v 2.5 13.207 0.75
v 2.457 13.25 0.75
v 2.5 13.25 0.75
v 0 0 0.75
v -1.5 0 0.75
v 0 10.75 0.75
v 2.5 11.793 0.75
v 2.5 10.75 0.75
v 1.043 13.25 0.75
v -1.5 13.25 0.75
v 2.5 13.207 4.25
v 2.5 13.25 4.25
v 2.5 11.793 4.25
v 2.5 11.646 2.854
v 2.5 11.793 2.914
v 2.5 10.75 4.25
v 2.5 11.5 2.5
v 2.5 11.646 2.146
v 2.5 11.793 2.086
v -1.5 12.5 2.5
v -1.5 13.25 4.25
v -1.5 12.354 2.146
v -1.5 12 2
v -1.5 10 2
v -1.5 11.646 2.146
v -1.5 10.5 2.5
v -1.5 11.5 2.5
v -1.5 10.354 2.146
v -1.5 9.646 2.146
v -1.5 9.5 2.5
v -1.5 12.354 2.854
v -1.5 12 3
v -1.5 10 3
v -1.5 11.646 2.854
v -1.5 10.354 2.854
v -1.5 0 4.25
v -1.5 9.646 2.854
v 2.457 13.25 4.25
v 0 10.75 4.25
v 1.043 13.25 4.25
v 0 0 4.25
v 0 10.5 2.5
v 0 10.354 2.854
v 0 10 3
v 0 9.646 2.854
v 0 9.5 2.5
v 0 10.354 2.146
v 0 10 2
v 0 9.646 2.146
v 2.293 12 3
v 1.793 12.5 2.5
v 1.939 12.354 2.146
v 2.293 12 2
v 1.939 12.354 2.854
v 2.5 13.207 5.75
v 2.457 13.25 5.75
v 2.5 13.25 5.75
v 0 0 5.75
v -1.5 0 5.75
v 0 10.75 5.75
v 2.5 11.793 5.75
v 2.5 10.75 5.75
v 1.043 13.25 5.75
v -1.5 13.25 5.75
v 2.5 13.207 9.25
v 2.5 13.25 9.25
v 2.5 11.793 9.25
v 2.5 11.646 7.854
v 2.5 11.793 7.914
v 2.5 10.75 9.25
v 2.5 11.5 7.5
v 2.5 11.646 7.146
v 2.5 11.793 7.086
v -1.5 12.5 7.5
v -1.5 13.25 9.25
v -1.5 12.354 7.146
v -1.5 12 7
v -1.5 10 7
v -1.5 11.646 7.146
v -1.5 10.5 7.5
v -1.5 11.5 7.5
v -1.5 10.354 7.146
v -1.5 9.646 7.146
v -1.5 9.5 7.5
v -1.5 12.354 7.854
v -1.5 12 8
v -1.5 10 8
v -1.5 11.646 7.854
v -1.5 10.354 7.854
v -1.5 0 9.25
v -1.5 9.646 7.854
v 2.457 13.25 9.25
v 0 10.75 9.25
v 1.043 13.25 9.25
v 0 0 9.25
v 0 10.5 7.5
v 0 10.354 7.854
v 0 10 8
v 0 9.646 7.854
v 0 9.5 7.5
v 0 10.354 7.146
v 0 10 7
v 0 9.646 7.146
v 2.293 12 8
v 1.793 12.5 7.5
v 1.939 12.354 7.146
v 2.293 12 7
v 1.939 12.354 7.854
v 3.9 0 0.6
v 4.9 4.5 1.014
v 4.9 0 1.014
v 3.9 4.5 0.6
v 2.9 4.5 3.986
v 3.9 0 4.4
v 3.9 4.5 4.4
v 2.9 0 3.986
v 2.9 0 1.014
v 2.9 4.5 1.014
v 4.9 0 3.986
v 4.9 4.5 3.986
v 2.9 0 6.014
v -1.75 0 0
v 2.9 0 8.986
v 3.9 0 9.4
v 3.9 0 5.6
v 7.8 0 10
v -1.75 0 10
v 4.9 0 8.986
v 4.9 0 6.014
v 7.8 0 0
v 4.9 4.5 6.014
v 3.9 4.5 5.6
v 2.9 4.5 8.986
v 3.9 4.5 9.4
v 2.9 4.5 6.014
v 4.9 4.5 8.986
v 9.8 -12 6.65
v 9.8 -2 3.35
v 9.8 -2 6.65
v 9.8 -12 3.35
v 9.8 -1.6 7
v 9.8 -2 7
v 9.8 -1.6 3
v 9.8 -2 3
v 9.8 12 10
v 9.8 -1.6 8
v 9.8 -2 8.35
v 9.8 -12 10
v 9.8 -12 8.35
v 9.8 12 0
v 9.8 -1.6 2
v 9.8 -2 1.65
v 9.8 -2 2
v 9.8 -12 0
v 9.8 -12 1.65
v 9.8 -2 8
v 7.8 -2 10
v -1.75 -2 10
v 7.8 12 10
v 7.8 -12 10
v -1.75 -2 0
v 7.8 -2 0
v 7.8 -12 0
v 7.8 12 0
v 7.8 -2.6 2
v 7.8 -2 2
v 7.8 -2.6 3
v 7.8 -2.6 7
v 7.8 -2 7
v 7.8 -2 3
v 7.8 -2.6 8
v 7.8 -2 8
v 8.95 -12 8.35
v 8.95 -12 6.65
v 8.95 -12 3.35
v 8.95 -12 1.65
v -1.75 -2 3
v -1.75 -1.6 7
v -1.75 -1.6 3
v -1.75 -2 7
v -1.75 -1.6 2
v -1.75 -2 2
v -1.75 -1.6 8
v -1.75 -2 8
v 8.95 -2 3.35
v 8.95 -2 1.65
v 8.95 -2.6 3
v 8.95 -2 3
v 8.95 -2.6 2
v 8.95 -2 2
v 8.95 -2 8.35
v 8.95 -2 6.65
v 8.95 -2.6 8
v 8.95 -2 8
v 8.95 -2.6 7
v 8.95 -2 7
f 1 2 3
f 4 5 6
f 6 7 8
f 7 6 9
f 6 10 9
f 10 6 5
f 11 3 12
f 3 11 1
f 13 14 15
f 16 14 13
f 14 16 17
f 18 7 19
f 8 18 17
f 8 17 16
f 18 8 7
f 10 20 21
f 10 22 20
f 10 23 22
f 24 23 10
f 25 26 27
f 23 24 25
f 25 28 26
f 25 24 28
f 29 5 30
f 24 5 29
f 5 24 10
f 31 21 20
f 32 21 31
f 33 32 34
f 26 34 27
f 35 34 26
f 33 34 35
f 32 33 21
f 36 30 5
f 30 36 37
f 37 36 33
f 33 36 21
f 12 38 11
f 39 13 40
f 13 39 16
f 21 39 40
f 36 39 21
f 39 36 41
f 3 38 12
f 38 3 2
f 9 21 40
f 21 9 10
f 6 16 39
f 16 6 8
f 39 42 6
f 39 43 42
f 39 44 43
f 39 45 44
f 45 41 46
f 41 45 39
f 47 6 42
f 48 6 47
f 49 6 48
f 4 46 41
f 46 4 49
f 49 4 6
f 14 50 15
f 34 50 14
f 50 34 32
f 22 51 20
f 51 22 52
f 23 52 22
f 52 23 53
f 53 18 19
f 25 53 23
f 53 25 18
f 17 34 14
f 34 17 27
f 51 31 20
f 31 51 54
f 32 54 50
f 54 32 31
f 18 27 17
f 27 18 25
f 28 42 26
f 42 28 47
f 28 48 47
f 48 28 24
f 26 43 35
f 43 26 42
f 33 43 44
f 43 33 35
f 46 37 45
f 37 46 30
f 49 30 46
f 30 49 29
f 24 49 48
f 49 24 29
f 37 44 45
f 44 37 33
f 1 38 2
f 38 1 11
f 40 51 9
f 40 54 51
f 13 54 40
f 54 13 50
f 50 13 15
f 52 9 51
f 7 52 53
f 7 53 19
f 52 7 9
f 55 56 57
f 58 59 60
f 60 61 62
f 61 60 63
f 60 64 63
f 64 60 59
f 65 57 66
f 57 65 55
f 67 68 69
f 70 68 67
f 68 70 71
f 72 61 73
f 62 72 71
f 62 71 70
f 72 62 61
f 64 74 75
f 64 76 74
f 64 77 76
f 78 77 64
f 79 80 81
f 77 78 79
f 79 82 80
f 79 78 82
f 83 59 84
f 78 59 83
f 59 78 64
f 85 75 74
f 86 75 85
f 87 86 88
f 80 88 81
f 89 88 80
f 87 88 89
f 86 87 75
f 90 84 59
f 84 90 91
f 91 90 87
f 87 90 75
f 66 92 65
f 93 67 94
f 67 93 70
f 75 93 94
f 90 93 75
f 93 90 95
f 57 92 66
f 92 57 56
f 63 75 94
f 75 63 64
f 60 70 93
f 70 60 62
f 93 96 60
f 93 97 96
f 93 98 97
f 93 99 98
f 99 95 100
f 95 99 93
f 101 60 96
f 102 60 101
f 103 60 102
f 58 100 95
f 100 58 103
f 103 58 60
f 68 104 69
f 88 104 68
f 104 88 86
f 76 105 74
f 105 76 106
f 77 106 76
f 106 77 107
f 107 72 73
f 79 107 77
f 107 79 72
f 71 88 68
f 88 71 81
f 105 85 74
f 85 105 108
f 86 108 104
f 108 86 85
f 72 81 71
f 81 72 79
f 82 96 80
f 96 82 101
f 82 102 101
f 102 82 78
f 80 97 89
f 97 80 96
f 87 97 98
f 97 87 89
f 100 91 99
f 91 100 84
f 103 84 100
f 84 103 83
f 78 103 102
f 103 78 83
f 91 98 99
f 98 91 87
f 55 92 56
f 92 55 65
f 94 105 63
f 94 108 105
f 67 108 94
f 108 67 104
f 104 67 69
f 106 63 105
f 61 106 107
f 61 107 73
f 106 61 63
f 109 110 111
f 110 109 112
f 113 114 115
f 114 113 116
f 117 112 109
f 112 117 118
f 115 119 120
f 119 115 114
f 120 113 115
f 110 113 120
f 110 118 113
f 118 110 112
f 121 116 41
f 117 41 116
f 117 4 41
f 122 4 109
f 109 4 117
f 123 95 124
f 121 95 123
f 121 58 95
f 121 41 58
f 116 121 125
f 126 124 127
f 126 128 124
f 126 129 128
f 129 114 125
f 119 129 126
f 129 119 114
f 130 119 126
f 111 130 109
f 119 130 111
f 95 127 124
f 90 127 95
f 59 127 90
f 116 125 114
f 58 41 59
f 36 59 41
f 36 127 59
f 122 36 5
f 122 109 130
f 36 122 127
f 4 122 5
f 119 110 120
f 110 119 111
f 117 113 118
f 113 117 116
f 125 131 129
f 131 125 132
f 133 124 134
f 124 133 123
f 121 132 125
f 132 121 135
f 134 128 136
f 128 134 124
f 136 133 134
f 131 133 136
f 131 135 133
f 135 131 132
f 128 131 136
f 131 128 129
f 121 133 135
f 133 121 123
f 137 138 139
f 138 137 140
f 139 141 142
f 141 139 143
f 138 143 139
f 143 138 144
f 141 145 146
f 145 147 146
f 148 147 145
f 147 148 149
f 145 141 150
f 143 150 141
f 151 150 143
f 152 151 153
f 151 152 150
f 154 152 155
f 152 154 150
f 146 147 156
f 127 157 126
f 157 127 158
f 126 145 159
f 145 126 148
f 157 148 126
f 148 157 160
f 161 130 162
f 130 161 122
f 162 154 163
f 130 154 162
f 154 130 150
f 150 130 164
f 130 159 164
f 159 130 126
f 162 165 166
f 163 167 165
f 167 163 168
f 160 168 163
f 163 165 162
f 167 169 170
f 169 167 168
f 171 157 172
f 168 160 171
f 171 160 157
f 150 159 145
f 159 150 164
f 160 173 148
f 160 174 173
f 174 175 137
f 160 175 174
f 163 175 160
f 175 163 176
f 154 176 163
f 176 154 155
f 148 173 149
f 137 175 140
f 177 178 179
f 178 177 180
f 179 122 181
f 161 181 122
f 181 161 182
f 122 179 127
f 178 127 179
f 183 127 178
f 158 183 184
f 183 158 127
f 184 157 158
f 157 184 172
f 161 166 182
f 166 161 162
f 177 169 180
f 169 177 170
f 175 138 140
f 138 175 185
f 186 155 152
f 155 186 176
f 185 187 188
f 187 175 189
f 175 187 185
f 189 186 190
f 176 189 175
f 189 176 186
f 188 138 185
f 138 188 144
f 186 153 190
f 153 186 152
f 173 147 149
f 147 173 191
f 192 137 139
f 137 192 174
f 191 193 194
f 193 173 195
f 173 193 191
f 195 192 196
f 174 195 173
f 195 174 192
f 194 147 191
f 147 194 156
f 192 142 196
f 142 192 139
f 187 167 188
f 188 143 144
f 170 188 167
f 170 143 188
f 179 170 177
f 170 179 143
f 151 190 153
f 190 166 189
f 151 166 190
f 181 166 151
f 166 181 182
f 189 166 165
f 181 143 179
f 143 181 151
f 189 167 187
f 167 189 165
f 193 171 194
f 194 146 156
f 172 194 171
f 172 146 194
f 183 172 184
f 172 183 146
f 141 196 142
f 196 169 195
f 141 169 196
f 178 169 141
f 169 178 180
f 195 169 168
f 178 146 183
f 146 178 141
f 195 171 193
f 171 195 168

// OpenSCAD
$fn=8;




ts=2; // толщина стенки
tp=1;//диаметр жилы
tpr=1.7;//диаметр провода
trb=[2,tp,2.5];//внешний, внутренний высота
knt=[12,7.8, 7.5];//высота до центра, толщина, высота стопора
lin=[3.5,knt.x+trb.x,1.5];//ширина, длина, толщина
shp=4.5;
do=3.8;
step=5;
kk=2;

all_2();
module all_2(){
    difference(){
        union(){
            for(a=[0:1:kk-1]){
                translate([0,0,a*step])pin2();
            }
            for(a=[0:1:kk-1]){
                translate([knt.y/2,0,a*step+step/2])ship();
            }
            hh=step*kk;
            translate([knt.y+ts/2, 0, hh/2]) cube([ts,knt.x*2,hh],true);
            translate([knt.y/2, -ts/2, hh/2]) cube([knt.y+ts+lin.z,ts,hh],true);
        }
        for(a=[0:1:kk-1]){
            translate([0,0,a*step])pin3();
        }
        for(a=[0:1:kk-1]){
            translate([0,0,a*step])pin4();
        }
    }
}

module ship(){
    intersection(){
        rotate([-90,0,0])cylinder(shp,do/2,do/2);
        cube([ts,do*4,8],true);
    }
}


module pin4(){
    translate([knt.x/2,-ts-0.1,step/2])cube([knt.x*2,tp,tp],true);;
}

module pin3(){
    translate([knt.y+ts,-knt.x/2-ts,step/2])cube([tpr,knt.x,tpr],true);;
}


module pin2(){
    //translate([-lin.z,knt.x,step/2])rotate([0,90,0])pin();
    translate([-lin.z,knt.x,step/2])rotate([0,90,0])pin_lin();
}

module pin1(){
    translate([0,0,lin.z])rotate([0,180,0])pin();
}
//pin_lin();
module pin(){
    difference(){
        union(){
            cylinder(trb.z+lin.z,trb.x/2,trb.x/2);
            translate([0, trb.x/2-lin.y/2,lin.z/2]) cube(lin,true);
        }
        translate([0,0,-0.1])cylinder(trb.z*2,trb.y/2,trb.y/2);
        translate([0,-(trb.x/2+trb.y),-0.1])cylinder(trb.z*2,trb.y/2,trb.y/2);
        translate([0, 0,trb.z+lin.z+trb.x/4]) rotate([-45,0,0])cube([trb.x*2,trb.x*2,trb.x/2],true);
    }
}
module pin_lin(){
    difference(){
        union(){
            //cylinder(trb.z+lin.z,trb.x/2,trb.x/2);
            translate([0, 0,(trb.z+lin.z)/2]) cube([lin.x,ts+0.5,trb.z+lin.z],true);
            translate([0, trb.x/2-lin.y/2,lin.z/2]) cube(lin,true);
        }
        translate([0,0,-0.1])cylinder(trb.z*2,trb.y/2,trb.y/2);
        translate([0,-(trb.x/2+trb.y),-0.1])cylinder(trb.z*2,trb.y/2,trb.y/2);
        translate([0, 0,trb.z+lin.z+trb.x/4]) rotate([-45,0,0])cube([trb.x*2,trb.x*3,trb.x/2],true);
    }
}
module pin_s(){
    difference(){
        union(){
            cylinder(trb.z+lin.z-trb.x/2,trb.x/2,trb.x/2);
            translate([0, 0,trb.z+lin.z-trb.x/2])sphere(r=trb.x/2);
            translate([0, trb.x/2-lin.y/2,lin.z/2]) cube(lin,true);
        }
        translate([0,0,-0.1])cylinder(trb.z*2,trb.y/2,trb.y/2);
        translate([0,-(trb.x/2+trb.y),-0.1])cylinder(trb.z*2,trb.y/2,trb.y/2);
    }
}
